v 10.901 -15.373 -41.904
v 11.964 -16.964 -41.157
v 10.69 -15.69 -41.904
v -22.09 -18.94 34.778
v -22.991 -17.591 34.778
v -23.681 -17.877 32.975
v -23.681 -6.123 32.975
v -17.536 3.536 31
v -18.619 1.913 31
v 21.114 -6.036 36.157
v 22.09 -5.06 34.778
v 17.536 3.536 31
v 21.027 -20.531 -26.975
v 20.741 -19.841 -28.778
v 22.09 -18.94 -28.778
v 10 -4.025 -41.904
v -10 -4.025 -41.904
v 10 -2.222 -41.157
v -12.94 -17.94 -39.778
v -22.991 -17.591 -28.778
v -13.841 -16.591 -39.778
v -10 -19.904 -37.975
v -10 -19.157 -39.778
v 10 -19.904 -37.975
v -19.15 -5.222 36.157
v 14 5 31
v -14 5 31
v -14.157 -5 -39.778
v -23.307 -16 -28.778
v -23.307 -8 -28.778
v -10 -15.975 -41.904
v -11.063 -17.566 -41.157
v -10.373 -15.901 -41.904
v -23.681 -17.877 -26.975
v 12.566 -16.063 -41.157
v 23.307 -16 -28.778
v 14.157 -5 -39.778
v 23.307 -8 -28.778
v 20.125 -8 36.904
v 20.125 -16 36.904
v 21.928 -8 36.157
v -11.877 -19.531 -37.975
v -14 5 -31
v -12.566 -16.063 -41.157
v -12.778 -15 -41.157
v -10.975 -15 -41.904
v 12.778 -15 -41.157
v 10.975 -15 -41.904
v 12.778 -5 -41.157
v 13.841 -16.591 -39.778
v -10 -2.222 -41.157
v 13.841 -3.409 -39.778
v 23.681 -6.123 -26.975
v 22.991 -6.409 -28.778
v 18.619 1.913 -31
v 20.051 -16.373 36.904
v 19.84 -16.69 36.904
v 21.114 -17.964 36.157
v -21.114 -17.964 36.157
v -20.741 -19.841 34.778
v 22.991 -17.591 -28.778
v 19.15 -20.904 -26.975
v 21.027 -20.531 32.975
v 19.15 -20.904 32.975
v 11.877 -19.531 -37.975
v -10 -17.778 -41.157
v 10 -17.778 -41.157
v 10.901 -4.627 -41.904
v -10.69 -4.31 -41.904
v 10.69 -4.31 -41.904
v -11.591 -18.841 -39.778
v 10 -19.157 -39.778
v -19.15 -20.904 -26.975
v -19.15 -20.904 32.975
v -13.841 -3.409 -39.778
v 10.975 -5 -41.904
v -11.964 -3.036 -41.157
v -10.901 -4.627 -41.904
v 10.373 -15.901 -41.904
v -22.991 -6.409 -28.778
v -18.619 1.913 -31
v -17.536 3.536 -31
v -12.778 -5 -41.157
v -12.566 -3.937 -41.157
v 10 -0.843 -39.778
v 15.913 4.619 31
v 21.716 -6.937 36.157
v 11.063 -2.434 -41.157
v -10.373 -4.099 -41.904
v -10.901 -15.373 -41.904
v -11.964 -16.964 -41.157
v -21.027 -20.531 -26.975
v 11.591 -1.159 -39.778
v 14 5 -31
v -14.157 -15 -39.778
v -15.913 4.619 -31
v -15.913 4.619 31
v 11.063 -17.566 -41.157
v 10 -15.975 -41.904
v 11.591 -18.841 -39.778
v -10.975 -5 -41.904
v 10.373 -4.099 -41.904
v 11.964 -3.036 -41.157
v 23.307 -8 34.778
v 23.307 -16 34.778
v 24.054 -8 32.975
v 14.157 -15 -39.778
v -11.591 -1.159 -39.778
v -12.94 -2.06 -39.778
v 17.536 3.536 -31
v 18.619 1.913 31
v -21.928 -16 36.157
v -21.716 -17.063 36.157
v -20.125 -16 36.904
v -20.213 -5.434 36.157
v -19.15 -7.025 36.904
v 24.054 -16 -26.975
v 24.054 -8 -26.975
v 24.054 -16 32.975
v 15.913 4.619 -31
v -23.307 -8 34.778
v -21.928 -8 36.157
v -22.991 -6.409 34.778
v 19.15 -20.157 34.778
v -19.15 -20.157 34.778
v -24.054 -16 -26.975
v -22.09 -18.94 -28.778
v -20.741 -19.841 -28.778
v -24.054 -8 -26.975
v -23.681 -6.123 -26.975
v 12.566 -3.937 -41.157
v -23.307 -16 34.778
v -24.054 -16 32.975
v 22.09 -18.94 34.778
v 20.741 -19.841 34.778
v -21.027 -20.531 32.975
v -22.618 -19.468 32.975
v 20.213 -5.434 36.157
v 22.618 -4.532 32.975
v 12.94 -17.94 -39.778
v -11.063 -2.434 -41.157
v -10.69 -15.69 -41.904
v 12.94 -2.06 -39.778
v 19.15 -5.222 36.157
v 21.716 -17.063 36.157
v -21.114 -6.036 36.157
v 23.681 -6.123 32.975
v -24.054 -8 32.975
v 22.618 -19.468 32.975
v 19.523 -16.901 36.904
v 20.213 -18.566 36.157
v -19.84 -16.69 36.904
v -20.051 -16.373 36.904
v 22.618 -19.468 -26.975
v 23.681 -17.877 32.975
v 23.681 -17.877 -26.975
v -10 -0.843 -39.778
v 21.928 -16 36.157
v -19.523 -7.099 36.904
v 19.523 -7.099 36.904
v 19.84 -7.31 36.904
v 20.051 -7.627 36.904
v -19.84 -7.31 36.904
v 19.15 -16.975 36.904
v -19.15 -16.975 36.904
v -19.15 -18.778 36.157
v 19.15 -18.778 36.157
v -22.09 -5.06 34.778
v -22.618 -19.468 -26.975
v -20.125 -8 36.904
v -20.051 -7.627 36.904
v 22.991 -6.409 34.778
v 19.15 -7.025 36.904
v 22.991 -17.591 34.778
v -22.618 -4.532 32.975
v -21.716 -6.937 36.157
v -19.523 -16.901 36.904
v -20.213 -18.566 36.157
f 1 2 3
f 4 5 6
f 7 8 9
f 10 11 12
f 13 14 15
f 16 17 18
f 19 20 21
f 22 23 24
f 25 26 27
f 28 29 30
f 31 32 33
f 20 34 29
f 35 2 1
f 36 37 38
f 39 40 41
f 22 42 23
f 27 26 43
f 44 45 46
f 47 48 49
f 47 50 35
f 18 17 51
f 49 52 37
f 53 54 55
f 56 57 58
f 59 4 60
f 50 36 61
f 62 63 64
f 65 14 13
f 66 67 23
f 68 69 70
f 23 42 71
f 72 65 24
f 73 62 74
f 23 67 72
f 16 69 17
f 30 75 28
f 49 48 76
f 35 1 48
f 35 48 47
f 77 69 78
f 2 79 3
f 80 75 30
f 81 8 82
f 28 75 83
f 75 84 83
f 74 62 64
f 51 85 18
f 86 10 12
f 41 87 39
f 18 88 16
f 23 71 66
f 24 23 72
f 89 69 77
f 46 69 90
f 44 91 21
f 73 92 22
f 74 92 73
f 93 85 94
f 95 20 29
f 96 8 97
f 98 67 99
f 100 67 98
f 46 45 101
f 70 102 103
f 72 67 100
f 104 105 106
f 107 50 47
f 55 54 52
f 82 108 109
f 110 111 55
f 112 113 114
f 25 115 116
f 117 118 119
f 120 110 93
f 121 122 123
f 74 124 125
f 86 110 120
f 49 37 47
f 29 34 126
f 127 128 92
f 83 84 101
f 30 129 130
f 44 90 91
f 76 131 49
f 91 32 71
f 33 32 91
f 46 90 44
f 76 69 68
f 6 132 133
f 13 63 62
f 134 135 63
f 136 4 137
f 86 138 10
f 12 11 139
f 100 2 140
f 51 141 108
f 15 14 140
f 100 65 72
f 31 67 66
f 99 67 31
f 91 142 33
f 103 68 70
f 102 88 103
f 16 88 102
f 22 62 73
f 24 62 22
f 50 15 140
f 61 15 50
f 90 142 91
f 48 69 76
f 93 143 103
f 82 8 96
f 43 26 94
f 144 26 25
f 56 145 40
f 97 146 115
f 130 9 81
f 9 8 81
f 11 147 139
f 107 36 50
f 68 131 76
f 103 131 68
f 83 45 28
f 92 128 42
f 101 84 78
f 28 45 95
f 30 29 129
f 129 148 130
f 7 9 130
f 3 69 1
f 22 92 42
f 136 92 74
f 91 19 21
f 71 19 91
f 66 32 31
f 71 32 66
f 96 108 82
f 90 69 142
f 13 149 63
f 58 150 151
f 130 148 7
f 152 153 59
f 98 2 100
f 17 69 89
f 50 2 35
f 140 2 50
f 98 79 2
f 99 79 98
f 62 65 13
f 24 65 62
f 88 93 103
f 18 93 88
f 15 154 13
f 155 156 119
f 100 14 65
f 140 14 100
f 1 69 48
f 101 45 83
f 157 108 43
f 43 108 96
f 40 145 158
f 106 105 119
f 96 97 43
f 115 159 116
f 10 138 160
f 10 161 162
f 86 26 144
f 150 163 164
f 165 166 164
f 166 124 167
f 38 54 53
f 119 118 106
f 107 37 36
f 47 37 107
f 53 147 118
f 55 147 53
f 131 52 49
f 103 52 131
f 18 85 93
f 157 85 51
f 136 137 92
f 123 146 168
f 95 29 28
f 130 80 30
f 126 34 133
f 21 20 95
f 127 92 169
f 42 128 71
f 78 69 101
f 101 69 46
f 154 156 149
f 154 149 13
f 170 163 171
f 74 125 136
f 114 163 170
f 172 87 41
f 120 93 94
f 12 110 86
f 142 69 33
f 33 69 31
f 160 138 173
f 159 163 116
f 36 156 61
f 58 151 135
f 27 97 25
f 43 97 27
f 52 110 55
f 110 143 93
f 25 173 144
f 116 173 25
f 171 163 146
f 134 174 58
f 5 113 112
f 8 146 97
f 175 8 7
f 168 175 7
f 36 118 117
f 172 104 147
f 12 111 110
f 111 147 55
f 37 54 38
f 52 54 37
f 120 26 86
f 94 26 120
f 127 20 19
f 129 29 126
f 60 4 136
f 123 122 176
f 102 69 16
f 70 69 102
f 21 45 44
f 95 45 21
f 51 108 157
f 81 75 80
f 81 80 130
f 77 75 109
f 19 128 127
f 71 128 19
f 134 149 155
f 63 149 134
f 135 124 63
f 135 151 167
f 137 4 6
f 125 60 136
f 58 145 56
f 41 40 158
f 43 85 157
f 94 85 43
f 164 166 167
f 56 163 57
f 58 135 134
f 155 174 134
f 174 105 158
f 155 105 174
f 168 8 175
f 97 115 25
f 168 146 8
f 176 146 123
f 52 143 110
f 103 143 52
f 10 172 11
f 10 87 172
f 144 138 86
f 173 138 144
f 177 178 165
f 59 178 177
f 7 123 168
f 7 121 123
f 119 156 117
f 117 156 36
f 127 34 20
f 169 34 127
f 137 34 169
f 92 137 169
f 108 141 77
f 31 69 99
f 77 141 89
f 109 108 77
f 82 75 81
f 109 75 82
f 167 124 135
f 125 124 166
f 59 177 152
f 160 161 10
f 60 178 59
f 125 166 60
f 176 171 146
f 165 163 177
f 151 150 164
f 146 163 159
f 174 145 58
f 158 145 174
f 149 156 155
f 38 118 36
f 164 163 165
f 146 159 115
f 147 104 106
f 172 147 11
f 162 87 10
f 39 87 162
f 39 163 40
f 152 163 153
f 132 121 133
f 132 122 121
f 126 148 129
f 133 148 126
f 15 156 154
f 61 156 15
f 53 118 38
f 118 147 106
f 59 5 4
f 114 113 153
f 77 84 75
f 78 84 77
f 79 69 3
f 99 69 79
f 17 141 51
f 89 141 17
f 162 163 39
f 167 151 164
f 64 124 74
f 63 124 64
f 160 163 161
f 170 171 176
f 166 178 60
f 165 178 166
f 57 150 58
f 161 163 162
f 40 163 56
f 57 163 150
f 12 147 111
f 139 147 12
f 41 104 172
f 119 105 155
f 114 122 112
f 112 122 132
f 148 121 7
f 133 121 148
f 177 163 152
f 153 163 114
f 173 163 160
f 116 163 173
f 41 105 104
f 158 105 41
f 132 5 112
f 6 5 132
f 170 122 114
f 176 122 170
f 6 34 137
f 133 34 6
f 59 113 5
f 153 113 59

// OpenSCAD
// file: lib/util.scad
module sphere_cube(length, width, height, r) {
    eps = 0.001;
    rc = min(r, length/2 - eps, width/2 - eps, height/2 - eps);
    minkowski() {
        cube([length - 2*rc, width - 2*rc, height - 2*rc], center=true);
        sphere(r=rc);
    }
}
// main file
// $fn=32;

use <lib/util.scad>

module cutout_primitives(){
    //two back cylinders
    translate([-14,0,0])
    cylinder(d = 10, h = 62, center = true);
    translate([14,0,0])
    cylinder(d = 10, h = 62, center = true);

    //center body cube
    translate([0,-12,3])
    sphere_cube(length=48.3, width=18, height=68, r=5);

    //lower bottom cube
    translate([0,-10,-34])
    sphere_cube(length=30, width=20, height=16, r=5);

}

hull()
cutout_primitives();
